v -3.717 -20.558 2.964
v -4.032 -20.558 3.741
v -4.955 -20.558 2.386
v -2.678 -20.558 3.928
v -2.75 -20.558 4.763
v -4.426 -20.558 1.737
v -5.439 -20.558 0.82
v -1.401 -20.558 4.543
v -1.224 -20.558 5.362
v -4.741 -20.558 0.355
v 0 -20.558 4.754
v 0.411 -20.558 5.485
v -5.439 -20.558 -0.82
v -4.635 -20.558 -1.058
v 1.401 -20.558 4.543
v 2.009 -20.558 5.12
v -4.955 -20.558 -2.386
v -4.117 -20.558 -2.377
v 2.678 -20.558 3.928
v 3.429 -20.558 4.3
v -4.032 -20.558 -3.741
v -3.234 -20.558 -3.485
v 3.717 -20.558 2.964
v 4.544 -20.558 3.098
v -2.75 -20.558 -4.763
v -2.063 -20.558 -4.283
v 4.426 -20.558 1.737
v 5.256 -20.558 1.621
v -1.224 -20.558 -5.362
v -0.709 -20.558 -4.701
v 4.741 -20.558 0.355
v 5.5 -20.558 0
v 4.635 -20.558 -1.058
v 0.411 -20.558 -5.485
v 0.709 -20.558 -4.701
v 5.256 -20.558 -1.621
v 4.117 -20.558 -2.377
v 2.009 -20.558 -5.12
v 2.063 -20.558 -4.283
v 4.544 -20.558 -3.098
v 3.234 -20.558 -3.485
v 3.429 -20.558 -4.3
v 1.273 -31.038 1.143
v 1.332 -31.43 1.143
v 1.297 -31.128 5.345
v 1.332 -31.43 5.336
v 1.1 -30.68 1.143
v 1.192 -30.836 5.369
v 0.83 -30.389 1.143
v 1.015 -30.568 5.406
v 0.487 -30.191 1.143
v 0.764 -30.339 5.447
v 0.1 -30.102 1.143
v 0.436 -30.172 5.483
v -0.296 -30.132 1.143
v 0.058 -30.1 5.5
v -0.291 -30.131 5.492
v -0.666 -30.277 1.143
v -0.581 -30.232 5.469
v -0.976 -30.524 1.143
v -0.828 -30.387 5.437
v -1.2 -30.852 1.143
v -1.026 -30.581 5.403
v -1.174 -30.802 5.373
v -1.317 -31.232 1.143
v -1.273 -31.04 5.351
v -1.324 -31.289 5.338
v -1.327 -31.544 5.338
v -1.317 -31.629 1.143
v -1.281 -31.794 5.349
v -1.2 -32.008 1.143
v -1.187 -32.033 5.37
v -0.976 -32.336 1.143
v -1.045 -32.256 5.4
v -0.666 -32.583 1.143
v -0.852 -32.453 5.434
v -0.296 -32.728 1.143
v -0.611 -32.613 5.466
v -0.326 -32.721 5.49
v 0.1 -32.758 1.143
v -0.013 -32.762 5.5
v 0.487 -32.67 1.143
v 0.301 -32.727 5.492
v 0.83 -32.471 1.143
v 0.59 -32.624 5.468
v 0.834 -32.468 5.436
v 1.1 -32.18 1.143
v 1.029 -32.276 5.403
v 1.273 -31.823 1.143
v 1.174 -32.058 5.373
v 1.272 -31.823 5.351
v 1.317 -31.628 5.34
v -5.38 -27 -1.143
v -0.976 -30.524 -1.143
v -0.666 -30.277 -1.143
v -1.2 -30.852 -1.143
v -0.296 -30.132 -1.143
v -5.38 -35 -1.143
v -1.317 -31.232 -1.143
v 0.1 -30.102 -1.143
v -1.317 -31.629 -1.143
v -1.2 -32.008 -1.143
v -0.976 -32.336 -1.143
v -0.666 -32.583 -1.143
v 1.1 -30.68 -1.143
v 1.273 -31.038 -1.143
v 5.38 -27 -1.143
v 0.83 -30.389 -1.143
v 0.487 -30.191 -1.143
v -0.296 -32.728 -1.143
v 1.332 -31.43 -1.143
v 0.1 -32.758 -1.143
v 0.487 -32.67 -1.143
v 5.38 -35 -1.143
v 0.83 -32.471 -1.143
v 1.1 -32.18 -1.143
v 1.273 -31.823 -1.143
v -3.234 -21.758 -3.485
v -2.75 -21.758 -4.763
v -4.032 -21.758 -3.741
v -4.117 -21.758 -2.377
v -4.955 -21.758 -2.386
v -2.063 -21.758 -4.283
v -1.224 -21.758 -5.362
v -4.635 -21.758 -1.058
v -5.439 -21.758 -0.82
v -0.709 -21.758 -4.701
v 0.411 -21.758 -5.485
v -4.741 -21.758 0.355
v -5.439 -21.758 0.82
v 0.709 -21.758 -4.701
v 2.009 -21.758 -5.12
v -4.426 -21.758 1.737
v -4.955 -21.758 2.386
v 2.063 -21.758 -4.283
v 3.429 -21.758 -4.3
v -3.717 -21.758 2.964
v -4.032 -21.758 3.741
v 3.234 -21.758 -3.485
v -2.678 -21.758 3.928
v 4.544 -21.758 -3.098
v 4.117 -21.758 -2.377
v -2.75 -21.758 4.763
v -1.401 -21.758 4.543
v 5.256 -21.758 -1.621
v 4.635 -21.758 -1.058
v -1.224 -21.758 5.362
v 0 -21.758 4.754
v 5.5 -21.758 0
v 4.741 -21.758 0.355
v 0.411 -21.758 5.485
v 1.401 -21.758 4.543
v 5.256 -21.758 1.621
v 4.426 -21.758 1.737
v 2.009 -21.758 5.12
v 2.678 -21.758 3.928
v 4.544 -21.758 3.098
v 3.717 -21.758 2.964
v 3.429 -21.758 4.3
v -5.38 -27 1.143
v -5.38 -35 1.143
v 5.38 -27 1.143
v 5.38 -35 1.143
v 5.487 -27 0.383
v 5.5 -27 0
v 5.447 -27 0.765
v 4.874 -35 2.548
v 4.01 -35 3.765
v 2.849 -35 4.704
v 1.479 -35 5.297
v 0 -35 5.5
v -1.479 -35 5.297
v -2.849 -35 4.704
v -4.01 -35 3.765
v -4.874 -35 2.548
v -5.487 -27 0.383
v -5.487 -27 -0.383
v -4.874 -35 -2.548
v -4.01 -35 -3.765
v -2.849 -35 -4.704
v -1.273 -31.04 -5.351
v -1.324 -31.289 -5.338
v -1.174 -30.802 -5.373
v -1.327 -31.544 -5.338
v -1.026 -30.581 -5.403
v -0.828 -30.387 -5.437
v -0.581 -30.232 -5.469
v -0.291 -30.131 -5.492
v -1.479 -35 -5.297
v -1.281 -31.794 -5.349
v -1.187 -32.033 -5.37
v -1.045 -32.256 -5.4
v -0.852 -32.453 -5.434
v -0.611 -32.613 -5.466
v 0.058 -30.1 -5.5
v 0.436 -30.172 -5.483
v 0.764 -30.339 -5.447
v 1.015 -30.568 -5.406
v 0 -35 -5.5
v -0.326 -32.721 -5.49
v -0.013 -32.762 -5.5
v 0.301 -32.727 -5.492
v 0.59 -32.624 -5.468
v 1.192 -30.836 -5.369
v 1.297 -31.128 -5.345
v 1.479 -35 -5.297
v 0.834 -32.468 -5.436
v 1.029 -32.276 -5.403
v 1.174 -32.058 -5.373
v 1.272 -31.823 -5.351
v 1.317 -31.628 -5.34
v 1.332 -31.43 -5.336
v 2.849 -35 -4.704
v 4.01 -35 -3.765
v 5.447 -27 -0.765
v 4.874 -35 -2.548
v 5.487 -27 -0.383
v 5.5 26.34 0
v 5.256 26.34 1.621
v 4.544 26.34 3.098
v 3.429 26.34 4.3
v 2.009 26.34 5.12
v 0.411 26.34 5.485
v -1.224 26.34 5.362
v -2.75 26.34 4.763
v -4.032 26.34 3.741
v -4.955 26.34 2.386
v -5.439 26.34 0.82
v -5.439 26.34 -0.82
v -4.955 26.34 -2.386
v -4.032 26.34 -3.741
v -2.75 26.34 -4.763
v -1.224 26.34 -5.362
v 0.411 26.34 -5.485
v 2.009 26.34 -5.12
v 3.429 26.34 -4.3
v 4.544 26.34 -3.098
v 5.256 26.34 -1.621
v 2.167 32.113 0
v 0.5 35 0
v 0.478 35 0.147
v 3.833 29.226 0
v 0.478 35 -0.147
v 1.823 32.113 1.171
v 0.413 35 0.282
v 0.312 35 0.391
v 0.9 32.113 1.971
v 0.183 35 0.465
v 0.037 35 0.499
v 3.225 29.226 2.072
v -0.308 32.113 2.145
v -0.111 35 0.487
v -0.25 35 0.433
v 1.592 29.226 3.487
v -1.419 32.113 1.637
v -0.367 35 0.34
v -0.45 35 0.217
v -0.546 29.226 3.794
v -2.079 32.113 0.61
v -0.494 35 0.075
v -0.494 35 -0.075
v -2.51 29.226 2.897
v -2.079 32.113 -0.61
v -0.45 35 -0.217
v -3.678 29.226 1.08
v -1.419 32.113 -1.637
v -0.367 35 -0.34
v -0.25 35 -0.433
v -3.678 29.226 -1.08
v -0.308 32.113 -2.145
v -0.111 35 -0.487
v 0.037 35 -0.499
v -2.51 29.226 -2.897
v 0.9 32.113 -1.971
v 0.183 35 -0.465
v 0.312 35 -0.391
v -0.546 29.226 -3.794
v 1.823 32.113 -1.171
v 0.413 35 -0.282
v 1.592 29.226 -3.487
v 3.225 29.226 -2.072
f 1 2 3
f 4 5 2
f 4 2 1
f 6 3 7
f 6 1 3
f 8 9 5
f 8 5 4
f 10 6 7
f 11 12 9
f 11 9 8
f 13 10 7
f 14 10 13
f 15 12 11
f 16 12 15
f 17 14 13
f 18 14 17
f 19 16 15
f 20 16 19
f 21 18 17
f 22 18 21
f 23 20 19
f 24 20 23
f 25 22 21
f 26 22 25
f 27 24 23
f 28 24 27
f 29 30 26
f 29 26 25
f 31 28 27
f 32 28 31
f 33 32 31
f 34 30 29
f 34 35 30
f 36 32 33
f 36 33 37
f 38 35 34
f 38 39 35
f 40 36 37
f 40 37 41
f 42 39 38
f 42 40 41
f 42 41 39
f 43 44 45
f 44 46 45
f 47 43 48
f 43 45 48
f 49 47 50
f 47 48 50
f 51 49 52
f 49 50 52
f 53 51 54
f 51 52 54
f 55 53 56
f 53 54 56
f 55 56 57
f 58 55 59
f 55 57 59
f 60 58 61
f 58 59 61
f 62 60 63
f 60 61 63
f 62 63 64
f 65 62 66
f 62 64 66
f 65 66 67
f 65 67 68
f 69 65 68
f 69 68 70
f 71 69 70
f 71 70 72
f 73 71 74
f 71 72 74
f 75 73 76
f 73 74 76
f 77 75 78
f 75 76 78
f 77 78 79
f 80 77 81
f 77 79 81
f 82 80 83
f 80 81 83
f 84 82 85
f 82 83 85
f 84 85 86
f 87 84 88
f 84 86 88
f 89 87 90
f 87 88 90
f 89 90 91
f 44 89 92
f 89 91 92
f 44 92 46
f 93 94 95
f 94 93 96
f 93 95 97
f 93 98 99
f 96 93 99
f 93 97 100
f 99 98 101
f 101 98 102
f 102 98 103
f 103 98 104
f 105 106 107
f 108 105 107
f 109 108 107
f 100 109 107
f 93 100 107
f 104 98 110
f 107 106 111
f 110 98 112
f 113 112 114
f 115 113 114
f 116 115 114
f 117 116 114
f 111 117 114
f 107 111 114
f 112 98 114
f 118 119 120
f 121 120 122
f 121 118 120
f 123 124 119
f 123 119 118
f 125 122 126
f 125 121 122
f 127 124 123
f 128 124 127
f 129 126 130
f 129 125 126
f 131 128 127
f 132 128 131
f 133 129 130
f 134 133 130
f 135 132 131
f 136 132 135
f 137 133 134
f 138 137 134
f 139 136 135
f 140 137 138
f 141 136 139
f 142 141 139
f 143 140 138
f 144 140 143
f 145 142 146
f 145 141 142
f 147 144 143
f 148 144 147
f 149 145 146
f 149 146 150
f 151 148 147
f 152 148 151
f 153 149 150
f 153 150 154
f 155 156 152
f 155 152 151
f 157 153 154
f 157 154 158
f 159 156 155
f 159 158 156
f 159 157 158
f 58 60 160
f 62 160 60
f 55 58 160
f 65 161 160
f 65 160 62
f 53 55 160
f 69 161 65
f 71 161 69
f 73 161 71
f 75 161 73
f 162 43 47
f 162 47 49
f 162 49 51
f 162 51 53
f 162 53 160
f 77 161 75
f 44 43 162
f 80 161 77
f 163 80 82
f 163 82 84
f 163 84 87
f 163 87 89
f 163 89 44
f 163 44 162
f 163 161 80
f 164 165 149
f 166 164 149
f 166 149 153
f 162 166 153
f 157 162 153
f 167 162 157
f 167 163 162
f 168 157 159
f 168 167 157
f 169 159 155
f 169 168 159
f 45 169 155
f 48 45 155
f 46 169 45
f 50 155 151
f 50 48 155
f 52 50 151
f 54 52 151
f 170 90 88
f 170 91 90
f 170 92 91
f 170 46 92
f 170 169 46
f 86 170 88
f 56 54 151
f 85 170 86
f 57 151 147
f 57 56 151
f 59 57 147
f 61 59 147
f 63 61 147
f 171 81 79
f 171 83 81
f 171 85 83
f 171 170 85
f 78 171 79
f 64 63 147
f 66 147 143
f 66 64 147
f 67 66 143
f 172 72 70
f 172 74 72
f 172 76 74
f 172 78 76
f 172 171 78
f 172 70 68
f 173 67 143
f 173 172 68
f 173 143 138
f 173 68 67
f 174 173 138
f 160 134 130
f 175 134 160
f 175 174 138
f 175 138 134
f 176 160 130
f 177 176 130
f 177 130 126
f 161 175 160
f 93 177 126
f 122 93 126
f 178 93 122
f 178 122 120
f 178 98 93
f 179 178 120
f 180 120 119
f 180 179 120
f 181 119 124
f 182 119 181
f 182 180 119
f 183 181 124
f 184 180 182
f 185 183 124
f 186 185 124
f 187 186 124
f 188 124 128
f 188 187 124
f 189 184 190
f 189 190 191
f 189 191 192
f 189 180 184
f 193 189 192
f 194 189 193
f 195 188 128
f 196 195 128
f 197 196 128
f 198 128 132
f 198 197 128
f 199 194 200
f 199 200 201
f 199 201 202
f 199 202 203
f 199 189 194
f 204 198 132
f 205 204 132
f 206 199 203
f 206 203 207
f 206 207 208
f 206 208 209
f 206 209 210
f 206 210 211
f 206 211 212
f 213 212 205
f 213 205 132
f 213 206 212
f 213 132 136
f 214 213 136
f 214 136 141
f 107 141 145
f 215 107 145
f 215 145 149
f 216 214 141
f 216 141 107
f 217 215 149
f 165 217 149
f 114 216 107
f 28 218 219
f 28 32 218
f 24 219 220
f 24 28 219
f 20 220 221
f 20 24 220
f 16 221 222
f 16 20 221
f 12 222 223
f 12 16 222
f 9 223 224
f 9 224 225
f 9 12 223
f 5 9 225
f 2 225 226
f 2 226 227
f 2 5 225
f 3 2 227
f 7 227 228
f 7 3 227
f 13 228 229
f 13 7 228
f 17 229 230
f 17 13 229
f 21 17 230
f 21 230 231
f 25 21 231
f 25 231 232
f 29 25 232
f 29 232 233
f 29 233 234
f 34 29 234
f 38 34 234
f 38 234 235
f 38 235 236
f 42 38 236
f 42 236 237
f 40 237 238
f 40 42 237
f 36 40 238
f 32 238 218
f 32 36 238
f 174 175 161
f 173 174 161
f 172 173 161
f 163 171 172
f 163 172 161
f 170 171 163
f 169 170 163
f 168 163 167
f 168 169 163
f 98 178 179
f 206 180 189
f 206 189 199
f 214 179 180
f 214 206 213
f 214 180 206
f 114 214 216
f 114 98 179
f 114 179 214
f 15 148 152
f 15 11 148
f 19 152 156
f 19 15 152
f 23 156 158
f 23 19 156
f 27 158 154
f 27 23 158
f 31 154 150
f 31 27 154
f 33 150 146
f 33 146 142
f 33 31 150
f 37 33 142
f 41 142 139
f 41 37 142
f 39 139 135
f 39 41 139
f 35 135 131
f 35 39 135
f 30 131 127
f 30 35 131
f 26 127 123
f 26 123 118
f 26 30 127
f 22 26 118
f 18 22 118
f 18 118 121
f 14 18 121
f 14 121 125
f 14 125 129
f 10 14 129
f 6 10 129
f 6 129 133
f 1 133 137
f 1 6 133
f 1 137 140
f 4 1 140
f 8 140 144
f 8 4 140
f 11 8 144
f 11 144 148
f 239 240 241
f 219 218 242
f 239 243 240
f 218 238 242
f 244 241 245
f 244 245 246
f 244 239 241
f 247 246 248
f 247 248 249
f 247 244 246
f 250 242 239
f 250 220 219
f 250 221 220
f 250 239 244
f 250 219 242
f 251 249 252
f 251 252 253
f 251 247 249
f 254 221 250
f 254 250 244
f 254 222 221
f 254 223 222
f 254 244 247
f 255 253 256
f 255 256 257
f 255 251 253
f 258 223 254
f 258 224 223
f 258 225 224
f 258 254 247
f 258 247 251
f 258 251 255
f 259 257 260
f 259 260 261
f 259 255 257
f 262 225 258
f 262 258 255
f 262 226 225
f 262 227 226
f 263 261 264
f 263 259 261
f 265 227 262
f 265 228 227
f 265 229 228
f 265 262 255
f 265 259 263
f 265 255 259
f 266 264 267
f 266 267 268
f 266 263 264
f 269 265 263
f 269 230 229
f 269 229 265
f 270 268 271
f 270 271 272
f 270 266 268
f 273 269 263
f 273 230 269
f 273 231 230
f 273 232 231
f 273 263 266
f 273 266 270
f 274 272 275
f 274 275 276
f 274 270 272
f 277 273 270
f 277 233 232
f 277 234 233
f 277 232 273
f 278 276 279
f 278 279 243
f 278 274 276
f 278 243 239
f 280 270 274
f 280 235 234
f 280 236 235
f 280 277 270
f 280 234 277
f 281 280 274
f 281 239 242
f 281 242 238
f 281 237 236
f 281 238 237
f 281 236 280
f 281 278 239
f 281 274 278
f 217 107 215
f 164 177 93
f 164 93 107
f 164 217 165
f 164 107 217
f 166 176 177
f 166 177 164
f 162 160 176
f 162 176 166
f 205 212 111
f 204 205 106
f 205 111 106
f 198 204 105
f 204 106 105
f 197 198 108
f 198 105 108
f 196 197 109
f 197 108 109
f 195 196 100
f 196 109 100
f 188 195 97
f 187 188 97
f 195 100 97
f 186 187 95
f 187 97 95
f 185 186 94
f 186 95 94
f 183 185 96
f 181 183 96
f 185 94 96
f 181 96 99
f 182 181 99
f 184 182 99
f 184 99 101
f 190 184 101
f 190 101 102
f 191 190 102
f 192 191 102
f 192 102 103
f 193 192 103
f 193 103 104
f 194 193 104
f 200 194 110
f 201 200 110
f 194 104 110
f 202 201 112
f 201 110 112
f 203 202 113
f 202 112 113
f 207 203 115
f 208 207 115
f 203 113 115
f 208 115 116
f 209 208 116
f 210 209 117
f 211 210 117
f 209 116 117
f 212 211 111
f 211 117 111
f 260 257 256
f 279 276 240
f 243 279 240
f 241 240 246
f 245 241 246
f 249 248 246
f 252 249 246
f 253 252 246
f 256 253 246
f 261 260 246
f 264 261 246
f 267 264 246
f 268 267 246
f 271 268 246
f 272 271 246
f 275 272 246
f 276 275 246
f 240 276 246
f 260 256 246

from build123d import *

# Parameters (mm, degrees)
F0_R     = 5.5
F1_DEPTH = 35
F2_SIZE2 = 8.6602540378
F2_SIZE  = 5
F4_W     = 13.5426148772
F4_H     = 2.286007395
F5_DEPTH = 8
F6_R     = 1.3316742147
F7_DEPTH = 10
F8_W     = 1.2
F8_H     = 1.4649596699
F8_H_2   = 0.745677419


with BuildPart() as f1:
    # F0 (on Front) → F1 (new body, symmetric)
    with BuildSketch(Plane.XZ):
        Circle(F0_R)
    extrude(amount=F1_DEPTH, both=True)

    # F2
    f2_edges = [f1.edges().sort_by_distance(p)[0] for p in [
        (-5.5, 35, 0),
    ]]
    f2_side = f1.faces().sort_by_distance((0, 35, 0))[0]
    chamfer(f2_edges, length=F2_SIZE, length2=F2_SIZE2, reference=f2_side)

    # F4 (on face) → F5 (cut)
    with BuildSketch(Plane.XZ.offset(35)):
        Rectangle(F4_W, F4_H)
    extrude(amount=-F5_DEPTH, mode=Mode.SUBTRACT)

    # F6 (on Top) → F7 (cut, symmetric)
    with BuildSketch(Plane.XY):
        with Locations((0, -31.4301326871)):
            Circle(F6_R)
    extrude(amount=F7_DEPTH, both=True, mode=Mode.SUBTRACT)

    # F8 (on Right) → F9 (revolve, cut)
    with BuildSketch(Plane.YZ):
        with Locations((-21.1584017664, 6.2324798349)):
            Rectangle(F8_W, F8_H)
        with Locations((-21.1584017664, 5.1271612905)):
            Rectangle(F8_W, F8_H_2)
    revolve(axis=Axis((0, -17.5, 0), (0, 1, 0)), mode=Mode.SUBTRACT)


with BuildPart() as f10_1:
    # F10: copy of F1
    add(f1.part.moved(Location((0, 0, 34))))


with BuildPart() as f12_1:
    # F12: copy of F1
    add(f1.part)


solid = f12_1.part
